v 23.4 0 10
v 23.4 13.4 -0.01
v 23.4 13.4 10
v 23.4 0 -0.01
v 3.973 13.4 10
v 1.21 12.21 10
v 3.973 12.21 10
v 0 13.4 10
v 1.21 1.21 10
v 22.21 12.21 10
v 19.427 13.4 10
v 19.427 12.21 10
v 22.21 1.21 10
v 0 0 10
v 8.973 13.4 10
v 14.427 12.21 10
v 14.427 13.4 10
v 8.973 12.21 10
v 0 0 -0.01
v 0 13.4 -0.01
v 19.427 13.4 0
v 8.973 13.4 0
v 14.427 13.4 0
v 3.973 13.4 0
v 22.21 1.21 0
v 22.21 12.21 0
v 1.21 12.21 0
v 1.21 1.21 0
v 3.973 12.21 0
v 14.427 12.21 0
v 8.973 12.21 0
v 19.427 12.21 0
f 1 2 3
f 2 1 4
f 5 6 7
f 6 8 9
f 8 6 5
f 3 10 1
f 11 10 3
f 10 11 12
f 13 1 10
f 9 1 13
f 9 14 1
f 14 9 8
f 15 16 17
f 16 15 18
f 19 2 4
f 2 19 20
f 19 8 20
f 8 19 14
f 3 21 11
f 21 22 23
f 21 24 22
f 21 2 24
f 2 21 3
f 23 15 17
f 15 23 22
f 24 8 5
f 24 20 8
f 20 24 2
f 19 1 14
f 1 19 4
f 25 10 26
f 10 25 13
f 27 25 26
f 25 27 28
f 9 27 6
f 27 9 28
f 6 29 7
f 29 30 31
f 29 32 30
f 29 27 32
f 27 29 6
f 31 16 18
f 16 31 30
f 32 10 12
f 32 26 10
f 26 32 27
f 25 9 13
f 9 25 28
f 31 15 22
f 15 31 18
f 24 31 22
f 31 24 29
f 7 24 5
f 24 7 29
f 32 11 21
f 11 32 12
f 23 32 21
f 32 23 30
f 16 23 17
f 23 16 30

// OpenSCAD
// file: ../../Base/Rotation.scad
// Fischertechnik Box Foundation
// Geometry Helpers Rotation

include <PlacementOptions.scad>

// getRotatedSpace(space, rotation=NoRotation)
// Rotates the space dependent on the specified rotation

function getRotatedSpace(space, rotation=NoRotation) = [
    (rotation == Rotate90 || rotation == Rotate270) ? space.y : space.x,
    (rotation == Rotate90 || rotation == Rotate270) ? space.x : space.y
];

// Rotates the given space around the fixed left lower corner
// space = the space the children needs as width/depth list [width,depth]
// rotation = 0 Rotate0 degrees, 1 Rotate90 degrees, 2 Rotate180 degrees, 3 Rotate270 degrees (equivalent to -90)

module RotateFix(space, rotation=NoRotation) {
    dy = (rotation == Rotate0 || rotation == Rotate270) ? 0 :
        (rotation == Rotate90) ? space.x :
        space.y;
    dx = (rotation < Rotate180) ? 0 :
        (rotation == Rotate180) ? space.x :
        space.y;
    
    translate([dx, dy, 0])
        rotate([0, 0, rotations[rotation]])
            children();
}
// file: ../../Base/Alignment.scad
// Fischertechnik Box Foundation
// Geometry Helpers Alignment

include <PlacementOptions.scad>

// getAlignedX(elementWidth, spaceWidth, align=AlignRight, offset=0)
// Gets the aligned X offset of an element with the given
// width in the given space.
// elementWidth = The width of the element to positon
// spaceWidth = The space where the element should be aligned
// align = 0 AlignLeft, 1 AlignCenter, 2 AlignRight
// offset = an optional offset from the aligned position. When
// aligned left or centered, then positive values are in X direction.
// When aligned right then positive values are in negative X direction.

function getAlignedX(elementWidth, spaceWidth, align=AlignRight, offset=0) =
    (align == AlignLeft) ?
        offset :
        ((align == AlignCenter) ?
        (spaceWidth - elementWidth)/2 + offset :
        spaceWidth - offset - elementWidth);

// getAlignedY(elementDepth, spaceDepth, align=AlignTop, offset=0)
// Gets the aligned Y offset of an element with the given
// depth in the given space.
// elementDepth = The depth of the element to positon
// spaceDepth = The space where the element should be aligned
// align = 0 AlignBottom, 1 AlignCenter, 2 AlignTop
// offset = an optional offset from the aligned position. When
// aligned bottom or centered, then positive values are in Y direction.
// When aligned top then positive values are in negative Y direction.

function getAlignedY(elementDepth, spaceDepth, align=AlignTop, offset=0) =
    (align == AlignBottom) ?
        offset :
        ((align == AlignCenter) ?
        (spaceDepth - elementDepth)/2 + offset :
        spaceDepth - offset - elementDepth);
// file: ../../Base/PlacementOptions.scad
// Fischertechnik Box Foundation
// Placement Options

// Alignment
NoAlign = 0;
AlignLeft = 1;
AlignBottom = 2;
AlignCenter = 3;
AlignRight = 4;
AlignTop = 5;

// Element rotation degree steps
rotations = [0, -90, -180, -270];

// Rotation
NoRotation = 0;
Rotate0 = 0;
Rotate90 = 1;
Rotate180 = 2;
Rotate270 = 3;

// Docking (seen from above)
NoDock = -1;
DockLeft = 0;
DockTop = 1;
DockRight = 2;
DockCorner = 2;
DockBottom = 3;

// Web corners
LowerLeft = 0;
UpperLeft = 1;
UpperRight = 2;
LowerRight = 3;

// Web position relative to corner
LeftOfCorner = 0;
RightOfCorner = 1;

// Rails direction
Horizontal = true;
Vertical = false;
// file: ../../Base/Boxes.scad
// Fischertechnik Box Foundation
// Pre-designed Boxes

use <Constants.scad>

include <PlacementOptions.scad>

box190Width = 190;
box190Depth = 130;
box130Width = 130;
box130Depth = 95;

// Values are from an original ec3 box
topBottomDifference = 1.5;
outerHeight = 40;
baseThickness = 1.8;
innerHeight = outerHeight - baseThickness;
stackExcess = 5.7;
radius = 3.5;
wallThickness = 1.5;
tolerance = 0.2;

boxWallThickness = wallThickness;
boxBaseThickness = baseThickness;
boxWebWidth = 3.0;

// getBoxWallThickness()
// Gets the wall thickness of a Fischertechnik Box
function getBoxWallThickness() = boxWallThickness;

// getBoxUsageHeight(height = 38.2)
// Gets the usable height of a Fischertechnik box
// height = Outer height of the box from the bottom to the upper edge.
function getBoxUsageHeight(height = outerHeight) = height - baseThickness - stackExcess;

// getBoxInnerHeight()
// Gets the inner height of a Fischertechnik box, including the stack excess
function getBoxInnerHeight() = innerHeight;

// getBoxBaseThickness()
// Gets the thickness of the Fischertechnik box base.
function getBoxBaseThickness() = boxBaseThickness;

// getBoxWebWidth()
// Gets the width of a box web
function getBoxWebWidth() = boxWebWidth;

// getBox190Space()
// Gets the usable inner space of a Box 190 as an x/y-list
function getBox190Space() = [
    box190Width - 2*getBoxWallThickness() - topBottomDifference, 
    box190Depth - 2*getBoxWallThickness() - topBottomDifference ];

// RoundedCornerPlate(width, depth, height, radius)
// Creates a body plate with rounded corners for a box. Used
// also to create the complete box with the hull module.
// width = Width of the plate
// depth = depth of the plate 
// height = thickness of the plate
// radius = radius of the rounded corner
module RoundedCornerPlate(width, depth, height, radius) {
    translate([radius, radius])
    hull() {
        w = width-2*radius;
        d = depth-2*radius;
        cube([w, d, height]);
        cylinder(height, r=radius, $fn=getFragments());
        translate([w, 0])
            cylinder(height, r=radius, $fn=getFragments());
        translate([w, d])
            cylinder(height, r=radius, $fn=getFragments());
        translate([0, d])
            cylinder(height, r=radius, $fn=getFragments());
    }
}

// BoxBase(width, depth)
// Creates an empty stackable Fischertechnik compatible box
// width = Outer width of the box (190, 130, ...)
// depth = Outer depth of the box (130, 95, ...)

module BoxBase(width, depth, height=outerHeight) {    
    thinPlate = 0.01;

    innerHeight = height - baseThickness;    
    
    module Body(tolerance=tolerance) {
        hull() {
            // Bottom with tolerance to fit into the original boxes when stacked
            translate([-wallThickness+tolerance, -wallThickness+tolerance, -baseThickness])
                RoundedCornerPlate(width-topBottomDifference-2*tolerance, depth-topBottomDifference-2*tolerance, thinPlate, radius);
            
            // Top
            translate([-wallThickness-topBottomDifference/2, -wallThickness-topBottomDifference/2, innerHeight-thinPlate])
                RoundedCornerPlate(width, depth, thinPlate, radius);
         }
    }

    module Cutoff() {
        hull() {
            coWidth = width - 2*wallThickness;
            coDepth = depth - 2*wallThickness;
            
            // Bottom
            RoundedCornerPlate(coWidth-topBottomDifference, coDepth-topBottomDifference, thinPlate, radius);

            // Top
            translate([-topBottomDifference/2, -topBottomDifference/2, innerHeight+thinPlate]) 
                RoundedCornerPlate(coWidth, coDepth, thinPlate, radius);
        }
    }
    
    difference() {        
        Body();
        Cutoff();
        stackOffset = innerHeight - stackExcess;
        translate([0, 0, stackOffset + baseThickness])
            Body(tolerance=0);
    }
}

// Creates the Fischertechnik empty box 130x190 mm and places it at position 0,0
// 190x130 are the outer sizes, the inner space is slightly smaller. Use getBox190Space() to get the inner sizes.
// The box is positioned that the usable inner space is at the 0,0,0 position.

module Box190() {
    BoxBase(box190Width, box190Depth);
}

// Gets the usable inner space of a Box 130 as an x/y-list
function getBox130Space() = [
    box130Width - 2*getBoxWallThickness() - topBottomDifference, 
    box130Depth - 2*getBoxWallThickness() - topBottomDifference ];

// Creates the Fischertechnik empty box 95x130 mm and places it at position 0,0
// 190x130 are the outer sizes, the inner space is slightly smaller. Use getBox190Space() to get the inner sizes.
// The box is positioned that the usable inner space is at the 0,0,0 position.

module Box130() {
    BoxBase(box130Width, box130Depth);
}

// Creates a web at the specified box walls
// corner 0 = LowerLeft, 1 = UpperLeft, 2 = UpperRight, 3 = LowerRight
// side 0 = LeftOfCorner, 1 = RightOfCorner
// distance = Distance in mm from the corner
// boxSpace = inner width and depth of the box (default: Box 190)
// webWidth = length of the web (default is 3 mms)
// webThickness = thickness of the web (default is 1 mm)
// height = Height of the web (standard is getBoxUsageHeight())
// sink = How much of the web is sunk into the wall

module BoxWeb(
    corner, 
    side, 
    distance, 
    boxSpace=getBox190Space(), 
    webWidth=getBoxWebWidth(), 
    webThickness=1.0, 
    height=getBoxUsageHeight(),
    sink = getBoxWallThickness()/2) {
    width = (corner % 2 == 0) ? 
            (side == LeftOfCorner ? webWidth : webThickness) :
            (side == LeftOfCorner ? webThickness : webWidth);

    depth = (corner % 2 == 0) ? 
            (side == RightOfCorner ? webWidth : webThickness) :
            (side == RightOfCorner ? webThickness : webWidth);
    
    xDiff = corner == LowerLeft ? 
                (side == LeftOfCorner ? -sink : distance) :
            (corner == UpperLeft ?                
                (side == LeftOfCorner ? distance : -sink) :
            (corner == UpperRight ?
                (side == LeftOfCorner ? boxSpace.x-webWidth+sink : boxSpace.x-distance-webThickness) :
                (side == LeftOfCorner ? boxSpace.x-distance-webThickness: boxSpace.x-webWidth+sink)));

    yDiff = corner == LowerLeft ? 
                (side == RightOfCorner ? -sink : distance) :
            (corner == UpperLeft ?
                (side == RightOfCorner ? boxSpace.y-distance-webThickness : boxSpace.y-webWidth+sink) :
            (corner == UpperRight ?
                (side == RightOfCorner ? boxSpace.y-webWidth+sink : boxSpace.y-distance-webThickness) :
                (side == RightOfCorner ? distance : -sink)));
    
    translate([xDiff, yDiff, -getExcess()])
        cube([width, depth, height + 2*getExcess()]);
}
// file: ../../Base/Placement.scad
// Fischertechnik Box Foundation
// Geometry Helpers Placement

use <Constants.scad>
use <Alignment.scad>
use <Rotation.scad>
use <Boxes.scad>

include <PlacementOptions.scad>

// Place(x=0, y=0, elementSpace=[0,0], alignX=AlignLeft, alignY=AlignBottom, rotation=Rotate0, boxSpace=getBox190Space())
// Places the child at the specified position
// y = Y-Position. This is a relative position when an X aligment is specified.
// x = X-Position. This is a relative position when an Y aligment is specified.
// elementSpace = space of the element to be placed [x,y]
// alignX = -1=NoAlign, 0 AlignLeft, 1 AlignCenter, 3 AlignRight (elementSpace and boxSpace required!)
// alignY = -1=NoAlign, 2 AlignBottom, 1 AlignCenter, 4 AlignTop (elementSpace and boxSpace required!)
// rotation = 0 Rotate0 0 degrees, 1 Rotate90 90 degrees, 
// 2 Rotate180 180 degrees, 3 Rotate270 270 degrees (equivalent to -90)
// boxSpace = Inner space of the box where the placement occurs [x,y] - default is Box 190x130 inner space

module Place(x=0, y=0, elementSpace=[0,0], 
  alignX=AlignLeft, alignY=AlignBottom, 
  rotation=NoRotation, boxSpace=getBox190Space()) {

    module Position(x, y, space, rotation=Rotate0) {
        translate([x, y, 0])
            RotateFix(space, rotation)
                children();
    }

    space = getRotatedSpace(elementSpace, rotation);
    alignedX = getAlignedX(space.x, boxSpace.x, alignX, x);
    alignedY = getAlignedY(space.y, boxSpace.y, alignY, y);
    Position(alignedX, alignedY, elementSpace, rotation)
        children();
}

// Center(space=getBox130Space(), elementSpace=[0,0])
// space = Space where the children is centered. For cylinder use centered=true and no elementSpace.
// elementSpace = space of the element to be centered [x,y]

module Center(space=getBox190Space(), elementSpace=[0,0]) {
    Place(elementSpace=elementSpace, boxSpace=space, alignX=AlignCenter, alignY=AlignCenter)
        children();
}

// CenterHorizontal(width=0, y=0, offset=0, space=getBox130Space())
// width = Width of the element to be placed.
// y = Y position of the element
// offset = Offset from the center position (negative will be left of the center)
// space = Space where the element is placed

module CenterHorizontal(width=0, y=0, offset=0, space=getBox190Space()) {
    Place(x=offset, y=y, elementSpace=[width, 0], boxSpace=space, alignX=AlignCenter)
        children(0);
}

// CenterVertical(depth=0, x=0, offset=0, space=getBox130Space())
// depth = Depth of the element to be placed.
// x = X position of the element
// offset = Offset from the center position (negative will be down of the center)
// space = Space where the element is placed

module CenterVertical(depth=0, x=0, offset=0, space=getBox190Space()) {
    Place(x=x, y=offset, elementSpace=[0, depth], boxSpace=space, alignY=AlignCenter)
        children(0);
}

// getIsVertical(align)
// True if the specified alignment needs a vertical orientation for a divider (AlignRight, AlignLeft)

function getIsVertical(align) = (align == AlignRight || align == AlignLeft);

// getIsHorizontal(align)
// True if the specified alignment needs a horizontal orientation for a divider (AlignTop, AlignBottom)

function getIsHorizontal(align) = (align == AlignTop || align == AlignBottom);
// file: ../../Base/Constants.scad
// Fischertechnik Box Foundation
// Constants

// Constant values necessary for multiple elements

// Base constants
dividerThickness = 1.2;
excess = 0.01;
fragments = 90;
tolerance = 0.8;

// Gets the thickness of a divider 
function getDividerThickness() = dividerThickness;

// Gets the excess that is used to merge walls into each other
function getExcess() = excess;

// Gets amount of fragments of a cylinder
function getFragments() = fragments;

// Gets the inner tolerance of a frame to each side
function getTolerance() = tolerance;


// Fischertechnik specific constants
axisDiameter = 4;
axisBottomDiameter = axisDiameter + 1;
axisTolerance = 0.2;
axisLockingLength = 8;

// Gets axis diameter of Fischertechnik axis
function getAxisDiameter() = axisDiameter;

// Gets axis diameter tolerance (subtracted for element axis)
function getAxisTolerance() = axisTolerance;

// Gets the axis diameter for standing axis
function getStandAxisDiameter() = getAxisDiameter() - getAxisTolerance();

// Gets axis bottom diameter for thicker part at the bottom
function getAxisBottomDiameter() = axisBottomDiameter;

// Gets the lengthh of the locking part of a locking axis
function getAxisLockingLength() = axisLockingLength;

pinHeight = 2.5;
pinTolerance = 0.2;

// gets the height of a connecting pin
function getPinHeight() = pinHeight;

// gets the connecting pin height tolerance
function getPinTolerance() = pinTolerance;

standardEdgeDistance = 2.5;
standardWebDistance = 11.5;
standardCornerLength = 15;

// gets the standard distance to the wall of the box for dockable frames with webs
function getStandardEdgeDistance() = standardEdgeDistance;

// gets the standard distance of each web to the corner of the dockable frame
function getStandardWebDistance() = standardWebDistance;

// gets the standard length of the corner walls of a dockable frame
function getStandardCornerLength() = standardCornerLength;

tubeWallFactor = 0.8;

// gets the wall thickness of a tube.
function getTubeWallThickness() = tubeWallFactor * getDividerThickness();

smallPartsFrameHeight = 20;

// gets the frame height for docked small parts boxes.
function getSmallPartsFrameHeight() = smallPartsFrameHeight;

hubRingDiameter = 19.5;
hubRingLevelDiameter = 21;

// gets the diameter of a tube matching the inner ring of a wheel
function getHubRingDiameter() = hubRingDiameter;

// gets the diameter of a hub tube with a thicker diameter
function getHubRingLevelDiameter() = hubRingLevelDiameter;
// main file
// Fischertechnik Box Foundation
// ModelBase
// Test FrameTopCutoffs

use <../../Base/Constants.scad>
use <../../ModelBase/Simple.scad>

width = 10;
count = 2;
cutoffWidth = 5;
tolerance = 1;

difference() {
    volume = [width * count,10,10];
    Frame(volume, tolerance);
    FrameTopCutoffs(volume, count, cutoffWidth, tolerance);
}
